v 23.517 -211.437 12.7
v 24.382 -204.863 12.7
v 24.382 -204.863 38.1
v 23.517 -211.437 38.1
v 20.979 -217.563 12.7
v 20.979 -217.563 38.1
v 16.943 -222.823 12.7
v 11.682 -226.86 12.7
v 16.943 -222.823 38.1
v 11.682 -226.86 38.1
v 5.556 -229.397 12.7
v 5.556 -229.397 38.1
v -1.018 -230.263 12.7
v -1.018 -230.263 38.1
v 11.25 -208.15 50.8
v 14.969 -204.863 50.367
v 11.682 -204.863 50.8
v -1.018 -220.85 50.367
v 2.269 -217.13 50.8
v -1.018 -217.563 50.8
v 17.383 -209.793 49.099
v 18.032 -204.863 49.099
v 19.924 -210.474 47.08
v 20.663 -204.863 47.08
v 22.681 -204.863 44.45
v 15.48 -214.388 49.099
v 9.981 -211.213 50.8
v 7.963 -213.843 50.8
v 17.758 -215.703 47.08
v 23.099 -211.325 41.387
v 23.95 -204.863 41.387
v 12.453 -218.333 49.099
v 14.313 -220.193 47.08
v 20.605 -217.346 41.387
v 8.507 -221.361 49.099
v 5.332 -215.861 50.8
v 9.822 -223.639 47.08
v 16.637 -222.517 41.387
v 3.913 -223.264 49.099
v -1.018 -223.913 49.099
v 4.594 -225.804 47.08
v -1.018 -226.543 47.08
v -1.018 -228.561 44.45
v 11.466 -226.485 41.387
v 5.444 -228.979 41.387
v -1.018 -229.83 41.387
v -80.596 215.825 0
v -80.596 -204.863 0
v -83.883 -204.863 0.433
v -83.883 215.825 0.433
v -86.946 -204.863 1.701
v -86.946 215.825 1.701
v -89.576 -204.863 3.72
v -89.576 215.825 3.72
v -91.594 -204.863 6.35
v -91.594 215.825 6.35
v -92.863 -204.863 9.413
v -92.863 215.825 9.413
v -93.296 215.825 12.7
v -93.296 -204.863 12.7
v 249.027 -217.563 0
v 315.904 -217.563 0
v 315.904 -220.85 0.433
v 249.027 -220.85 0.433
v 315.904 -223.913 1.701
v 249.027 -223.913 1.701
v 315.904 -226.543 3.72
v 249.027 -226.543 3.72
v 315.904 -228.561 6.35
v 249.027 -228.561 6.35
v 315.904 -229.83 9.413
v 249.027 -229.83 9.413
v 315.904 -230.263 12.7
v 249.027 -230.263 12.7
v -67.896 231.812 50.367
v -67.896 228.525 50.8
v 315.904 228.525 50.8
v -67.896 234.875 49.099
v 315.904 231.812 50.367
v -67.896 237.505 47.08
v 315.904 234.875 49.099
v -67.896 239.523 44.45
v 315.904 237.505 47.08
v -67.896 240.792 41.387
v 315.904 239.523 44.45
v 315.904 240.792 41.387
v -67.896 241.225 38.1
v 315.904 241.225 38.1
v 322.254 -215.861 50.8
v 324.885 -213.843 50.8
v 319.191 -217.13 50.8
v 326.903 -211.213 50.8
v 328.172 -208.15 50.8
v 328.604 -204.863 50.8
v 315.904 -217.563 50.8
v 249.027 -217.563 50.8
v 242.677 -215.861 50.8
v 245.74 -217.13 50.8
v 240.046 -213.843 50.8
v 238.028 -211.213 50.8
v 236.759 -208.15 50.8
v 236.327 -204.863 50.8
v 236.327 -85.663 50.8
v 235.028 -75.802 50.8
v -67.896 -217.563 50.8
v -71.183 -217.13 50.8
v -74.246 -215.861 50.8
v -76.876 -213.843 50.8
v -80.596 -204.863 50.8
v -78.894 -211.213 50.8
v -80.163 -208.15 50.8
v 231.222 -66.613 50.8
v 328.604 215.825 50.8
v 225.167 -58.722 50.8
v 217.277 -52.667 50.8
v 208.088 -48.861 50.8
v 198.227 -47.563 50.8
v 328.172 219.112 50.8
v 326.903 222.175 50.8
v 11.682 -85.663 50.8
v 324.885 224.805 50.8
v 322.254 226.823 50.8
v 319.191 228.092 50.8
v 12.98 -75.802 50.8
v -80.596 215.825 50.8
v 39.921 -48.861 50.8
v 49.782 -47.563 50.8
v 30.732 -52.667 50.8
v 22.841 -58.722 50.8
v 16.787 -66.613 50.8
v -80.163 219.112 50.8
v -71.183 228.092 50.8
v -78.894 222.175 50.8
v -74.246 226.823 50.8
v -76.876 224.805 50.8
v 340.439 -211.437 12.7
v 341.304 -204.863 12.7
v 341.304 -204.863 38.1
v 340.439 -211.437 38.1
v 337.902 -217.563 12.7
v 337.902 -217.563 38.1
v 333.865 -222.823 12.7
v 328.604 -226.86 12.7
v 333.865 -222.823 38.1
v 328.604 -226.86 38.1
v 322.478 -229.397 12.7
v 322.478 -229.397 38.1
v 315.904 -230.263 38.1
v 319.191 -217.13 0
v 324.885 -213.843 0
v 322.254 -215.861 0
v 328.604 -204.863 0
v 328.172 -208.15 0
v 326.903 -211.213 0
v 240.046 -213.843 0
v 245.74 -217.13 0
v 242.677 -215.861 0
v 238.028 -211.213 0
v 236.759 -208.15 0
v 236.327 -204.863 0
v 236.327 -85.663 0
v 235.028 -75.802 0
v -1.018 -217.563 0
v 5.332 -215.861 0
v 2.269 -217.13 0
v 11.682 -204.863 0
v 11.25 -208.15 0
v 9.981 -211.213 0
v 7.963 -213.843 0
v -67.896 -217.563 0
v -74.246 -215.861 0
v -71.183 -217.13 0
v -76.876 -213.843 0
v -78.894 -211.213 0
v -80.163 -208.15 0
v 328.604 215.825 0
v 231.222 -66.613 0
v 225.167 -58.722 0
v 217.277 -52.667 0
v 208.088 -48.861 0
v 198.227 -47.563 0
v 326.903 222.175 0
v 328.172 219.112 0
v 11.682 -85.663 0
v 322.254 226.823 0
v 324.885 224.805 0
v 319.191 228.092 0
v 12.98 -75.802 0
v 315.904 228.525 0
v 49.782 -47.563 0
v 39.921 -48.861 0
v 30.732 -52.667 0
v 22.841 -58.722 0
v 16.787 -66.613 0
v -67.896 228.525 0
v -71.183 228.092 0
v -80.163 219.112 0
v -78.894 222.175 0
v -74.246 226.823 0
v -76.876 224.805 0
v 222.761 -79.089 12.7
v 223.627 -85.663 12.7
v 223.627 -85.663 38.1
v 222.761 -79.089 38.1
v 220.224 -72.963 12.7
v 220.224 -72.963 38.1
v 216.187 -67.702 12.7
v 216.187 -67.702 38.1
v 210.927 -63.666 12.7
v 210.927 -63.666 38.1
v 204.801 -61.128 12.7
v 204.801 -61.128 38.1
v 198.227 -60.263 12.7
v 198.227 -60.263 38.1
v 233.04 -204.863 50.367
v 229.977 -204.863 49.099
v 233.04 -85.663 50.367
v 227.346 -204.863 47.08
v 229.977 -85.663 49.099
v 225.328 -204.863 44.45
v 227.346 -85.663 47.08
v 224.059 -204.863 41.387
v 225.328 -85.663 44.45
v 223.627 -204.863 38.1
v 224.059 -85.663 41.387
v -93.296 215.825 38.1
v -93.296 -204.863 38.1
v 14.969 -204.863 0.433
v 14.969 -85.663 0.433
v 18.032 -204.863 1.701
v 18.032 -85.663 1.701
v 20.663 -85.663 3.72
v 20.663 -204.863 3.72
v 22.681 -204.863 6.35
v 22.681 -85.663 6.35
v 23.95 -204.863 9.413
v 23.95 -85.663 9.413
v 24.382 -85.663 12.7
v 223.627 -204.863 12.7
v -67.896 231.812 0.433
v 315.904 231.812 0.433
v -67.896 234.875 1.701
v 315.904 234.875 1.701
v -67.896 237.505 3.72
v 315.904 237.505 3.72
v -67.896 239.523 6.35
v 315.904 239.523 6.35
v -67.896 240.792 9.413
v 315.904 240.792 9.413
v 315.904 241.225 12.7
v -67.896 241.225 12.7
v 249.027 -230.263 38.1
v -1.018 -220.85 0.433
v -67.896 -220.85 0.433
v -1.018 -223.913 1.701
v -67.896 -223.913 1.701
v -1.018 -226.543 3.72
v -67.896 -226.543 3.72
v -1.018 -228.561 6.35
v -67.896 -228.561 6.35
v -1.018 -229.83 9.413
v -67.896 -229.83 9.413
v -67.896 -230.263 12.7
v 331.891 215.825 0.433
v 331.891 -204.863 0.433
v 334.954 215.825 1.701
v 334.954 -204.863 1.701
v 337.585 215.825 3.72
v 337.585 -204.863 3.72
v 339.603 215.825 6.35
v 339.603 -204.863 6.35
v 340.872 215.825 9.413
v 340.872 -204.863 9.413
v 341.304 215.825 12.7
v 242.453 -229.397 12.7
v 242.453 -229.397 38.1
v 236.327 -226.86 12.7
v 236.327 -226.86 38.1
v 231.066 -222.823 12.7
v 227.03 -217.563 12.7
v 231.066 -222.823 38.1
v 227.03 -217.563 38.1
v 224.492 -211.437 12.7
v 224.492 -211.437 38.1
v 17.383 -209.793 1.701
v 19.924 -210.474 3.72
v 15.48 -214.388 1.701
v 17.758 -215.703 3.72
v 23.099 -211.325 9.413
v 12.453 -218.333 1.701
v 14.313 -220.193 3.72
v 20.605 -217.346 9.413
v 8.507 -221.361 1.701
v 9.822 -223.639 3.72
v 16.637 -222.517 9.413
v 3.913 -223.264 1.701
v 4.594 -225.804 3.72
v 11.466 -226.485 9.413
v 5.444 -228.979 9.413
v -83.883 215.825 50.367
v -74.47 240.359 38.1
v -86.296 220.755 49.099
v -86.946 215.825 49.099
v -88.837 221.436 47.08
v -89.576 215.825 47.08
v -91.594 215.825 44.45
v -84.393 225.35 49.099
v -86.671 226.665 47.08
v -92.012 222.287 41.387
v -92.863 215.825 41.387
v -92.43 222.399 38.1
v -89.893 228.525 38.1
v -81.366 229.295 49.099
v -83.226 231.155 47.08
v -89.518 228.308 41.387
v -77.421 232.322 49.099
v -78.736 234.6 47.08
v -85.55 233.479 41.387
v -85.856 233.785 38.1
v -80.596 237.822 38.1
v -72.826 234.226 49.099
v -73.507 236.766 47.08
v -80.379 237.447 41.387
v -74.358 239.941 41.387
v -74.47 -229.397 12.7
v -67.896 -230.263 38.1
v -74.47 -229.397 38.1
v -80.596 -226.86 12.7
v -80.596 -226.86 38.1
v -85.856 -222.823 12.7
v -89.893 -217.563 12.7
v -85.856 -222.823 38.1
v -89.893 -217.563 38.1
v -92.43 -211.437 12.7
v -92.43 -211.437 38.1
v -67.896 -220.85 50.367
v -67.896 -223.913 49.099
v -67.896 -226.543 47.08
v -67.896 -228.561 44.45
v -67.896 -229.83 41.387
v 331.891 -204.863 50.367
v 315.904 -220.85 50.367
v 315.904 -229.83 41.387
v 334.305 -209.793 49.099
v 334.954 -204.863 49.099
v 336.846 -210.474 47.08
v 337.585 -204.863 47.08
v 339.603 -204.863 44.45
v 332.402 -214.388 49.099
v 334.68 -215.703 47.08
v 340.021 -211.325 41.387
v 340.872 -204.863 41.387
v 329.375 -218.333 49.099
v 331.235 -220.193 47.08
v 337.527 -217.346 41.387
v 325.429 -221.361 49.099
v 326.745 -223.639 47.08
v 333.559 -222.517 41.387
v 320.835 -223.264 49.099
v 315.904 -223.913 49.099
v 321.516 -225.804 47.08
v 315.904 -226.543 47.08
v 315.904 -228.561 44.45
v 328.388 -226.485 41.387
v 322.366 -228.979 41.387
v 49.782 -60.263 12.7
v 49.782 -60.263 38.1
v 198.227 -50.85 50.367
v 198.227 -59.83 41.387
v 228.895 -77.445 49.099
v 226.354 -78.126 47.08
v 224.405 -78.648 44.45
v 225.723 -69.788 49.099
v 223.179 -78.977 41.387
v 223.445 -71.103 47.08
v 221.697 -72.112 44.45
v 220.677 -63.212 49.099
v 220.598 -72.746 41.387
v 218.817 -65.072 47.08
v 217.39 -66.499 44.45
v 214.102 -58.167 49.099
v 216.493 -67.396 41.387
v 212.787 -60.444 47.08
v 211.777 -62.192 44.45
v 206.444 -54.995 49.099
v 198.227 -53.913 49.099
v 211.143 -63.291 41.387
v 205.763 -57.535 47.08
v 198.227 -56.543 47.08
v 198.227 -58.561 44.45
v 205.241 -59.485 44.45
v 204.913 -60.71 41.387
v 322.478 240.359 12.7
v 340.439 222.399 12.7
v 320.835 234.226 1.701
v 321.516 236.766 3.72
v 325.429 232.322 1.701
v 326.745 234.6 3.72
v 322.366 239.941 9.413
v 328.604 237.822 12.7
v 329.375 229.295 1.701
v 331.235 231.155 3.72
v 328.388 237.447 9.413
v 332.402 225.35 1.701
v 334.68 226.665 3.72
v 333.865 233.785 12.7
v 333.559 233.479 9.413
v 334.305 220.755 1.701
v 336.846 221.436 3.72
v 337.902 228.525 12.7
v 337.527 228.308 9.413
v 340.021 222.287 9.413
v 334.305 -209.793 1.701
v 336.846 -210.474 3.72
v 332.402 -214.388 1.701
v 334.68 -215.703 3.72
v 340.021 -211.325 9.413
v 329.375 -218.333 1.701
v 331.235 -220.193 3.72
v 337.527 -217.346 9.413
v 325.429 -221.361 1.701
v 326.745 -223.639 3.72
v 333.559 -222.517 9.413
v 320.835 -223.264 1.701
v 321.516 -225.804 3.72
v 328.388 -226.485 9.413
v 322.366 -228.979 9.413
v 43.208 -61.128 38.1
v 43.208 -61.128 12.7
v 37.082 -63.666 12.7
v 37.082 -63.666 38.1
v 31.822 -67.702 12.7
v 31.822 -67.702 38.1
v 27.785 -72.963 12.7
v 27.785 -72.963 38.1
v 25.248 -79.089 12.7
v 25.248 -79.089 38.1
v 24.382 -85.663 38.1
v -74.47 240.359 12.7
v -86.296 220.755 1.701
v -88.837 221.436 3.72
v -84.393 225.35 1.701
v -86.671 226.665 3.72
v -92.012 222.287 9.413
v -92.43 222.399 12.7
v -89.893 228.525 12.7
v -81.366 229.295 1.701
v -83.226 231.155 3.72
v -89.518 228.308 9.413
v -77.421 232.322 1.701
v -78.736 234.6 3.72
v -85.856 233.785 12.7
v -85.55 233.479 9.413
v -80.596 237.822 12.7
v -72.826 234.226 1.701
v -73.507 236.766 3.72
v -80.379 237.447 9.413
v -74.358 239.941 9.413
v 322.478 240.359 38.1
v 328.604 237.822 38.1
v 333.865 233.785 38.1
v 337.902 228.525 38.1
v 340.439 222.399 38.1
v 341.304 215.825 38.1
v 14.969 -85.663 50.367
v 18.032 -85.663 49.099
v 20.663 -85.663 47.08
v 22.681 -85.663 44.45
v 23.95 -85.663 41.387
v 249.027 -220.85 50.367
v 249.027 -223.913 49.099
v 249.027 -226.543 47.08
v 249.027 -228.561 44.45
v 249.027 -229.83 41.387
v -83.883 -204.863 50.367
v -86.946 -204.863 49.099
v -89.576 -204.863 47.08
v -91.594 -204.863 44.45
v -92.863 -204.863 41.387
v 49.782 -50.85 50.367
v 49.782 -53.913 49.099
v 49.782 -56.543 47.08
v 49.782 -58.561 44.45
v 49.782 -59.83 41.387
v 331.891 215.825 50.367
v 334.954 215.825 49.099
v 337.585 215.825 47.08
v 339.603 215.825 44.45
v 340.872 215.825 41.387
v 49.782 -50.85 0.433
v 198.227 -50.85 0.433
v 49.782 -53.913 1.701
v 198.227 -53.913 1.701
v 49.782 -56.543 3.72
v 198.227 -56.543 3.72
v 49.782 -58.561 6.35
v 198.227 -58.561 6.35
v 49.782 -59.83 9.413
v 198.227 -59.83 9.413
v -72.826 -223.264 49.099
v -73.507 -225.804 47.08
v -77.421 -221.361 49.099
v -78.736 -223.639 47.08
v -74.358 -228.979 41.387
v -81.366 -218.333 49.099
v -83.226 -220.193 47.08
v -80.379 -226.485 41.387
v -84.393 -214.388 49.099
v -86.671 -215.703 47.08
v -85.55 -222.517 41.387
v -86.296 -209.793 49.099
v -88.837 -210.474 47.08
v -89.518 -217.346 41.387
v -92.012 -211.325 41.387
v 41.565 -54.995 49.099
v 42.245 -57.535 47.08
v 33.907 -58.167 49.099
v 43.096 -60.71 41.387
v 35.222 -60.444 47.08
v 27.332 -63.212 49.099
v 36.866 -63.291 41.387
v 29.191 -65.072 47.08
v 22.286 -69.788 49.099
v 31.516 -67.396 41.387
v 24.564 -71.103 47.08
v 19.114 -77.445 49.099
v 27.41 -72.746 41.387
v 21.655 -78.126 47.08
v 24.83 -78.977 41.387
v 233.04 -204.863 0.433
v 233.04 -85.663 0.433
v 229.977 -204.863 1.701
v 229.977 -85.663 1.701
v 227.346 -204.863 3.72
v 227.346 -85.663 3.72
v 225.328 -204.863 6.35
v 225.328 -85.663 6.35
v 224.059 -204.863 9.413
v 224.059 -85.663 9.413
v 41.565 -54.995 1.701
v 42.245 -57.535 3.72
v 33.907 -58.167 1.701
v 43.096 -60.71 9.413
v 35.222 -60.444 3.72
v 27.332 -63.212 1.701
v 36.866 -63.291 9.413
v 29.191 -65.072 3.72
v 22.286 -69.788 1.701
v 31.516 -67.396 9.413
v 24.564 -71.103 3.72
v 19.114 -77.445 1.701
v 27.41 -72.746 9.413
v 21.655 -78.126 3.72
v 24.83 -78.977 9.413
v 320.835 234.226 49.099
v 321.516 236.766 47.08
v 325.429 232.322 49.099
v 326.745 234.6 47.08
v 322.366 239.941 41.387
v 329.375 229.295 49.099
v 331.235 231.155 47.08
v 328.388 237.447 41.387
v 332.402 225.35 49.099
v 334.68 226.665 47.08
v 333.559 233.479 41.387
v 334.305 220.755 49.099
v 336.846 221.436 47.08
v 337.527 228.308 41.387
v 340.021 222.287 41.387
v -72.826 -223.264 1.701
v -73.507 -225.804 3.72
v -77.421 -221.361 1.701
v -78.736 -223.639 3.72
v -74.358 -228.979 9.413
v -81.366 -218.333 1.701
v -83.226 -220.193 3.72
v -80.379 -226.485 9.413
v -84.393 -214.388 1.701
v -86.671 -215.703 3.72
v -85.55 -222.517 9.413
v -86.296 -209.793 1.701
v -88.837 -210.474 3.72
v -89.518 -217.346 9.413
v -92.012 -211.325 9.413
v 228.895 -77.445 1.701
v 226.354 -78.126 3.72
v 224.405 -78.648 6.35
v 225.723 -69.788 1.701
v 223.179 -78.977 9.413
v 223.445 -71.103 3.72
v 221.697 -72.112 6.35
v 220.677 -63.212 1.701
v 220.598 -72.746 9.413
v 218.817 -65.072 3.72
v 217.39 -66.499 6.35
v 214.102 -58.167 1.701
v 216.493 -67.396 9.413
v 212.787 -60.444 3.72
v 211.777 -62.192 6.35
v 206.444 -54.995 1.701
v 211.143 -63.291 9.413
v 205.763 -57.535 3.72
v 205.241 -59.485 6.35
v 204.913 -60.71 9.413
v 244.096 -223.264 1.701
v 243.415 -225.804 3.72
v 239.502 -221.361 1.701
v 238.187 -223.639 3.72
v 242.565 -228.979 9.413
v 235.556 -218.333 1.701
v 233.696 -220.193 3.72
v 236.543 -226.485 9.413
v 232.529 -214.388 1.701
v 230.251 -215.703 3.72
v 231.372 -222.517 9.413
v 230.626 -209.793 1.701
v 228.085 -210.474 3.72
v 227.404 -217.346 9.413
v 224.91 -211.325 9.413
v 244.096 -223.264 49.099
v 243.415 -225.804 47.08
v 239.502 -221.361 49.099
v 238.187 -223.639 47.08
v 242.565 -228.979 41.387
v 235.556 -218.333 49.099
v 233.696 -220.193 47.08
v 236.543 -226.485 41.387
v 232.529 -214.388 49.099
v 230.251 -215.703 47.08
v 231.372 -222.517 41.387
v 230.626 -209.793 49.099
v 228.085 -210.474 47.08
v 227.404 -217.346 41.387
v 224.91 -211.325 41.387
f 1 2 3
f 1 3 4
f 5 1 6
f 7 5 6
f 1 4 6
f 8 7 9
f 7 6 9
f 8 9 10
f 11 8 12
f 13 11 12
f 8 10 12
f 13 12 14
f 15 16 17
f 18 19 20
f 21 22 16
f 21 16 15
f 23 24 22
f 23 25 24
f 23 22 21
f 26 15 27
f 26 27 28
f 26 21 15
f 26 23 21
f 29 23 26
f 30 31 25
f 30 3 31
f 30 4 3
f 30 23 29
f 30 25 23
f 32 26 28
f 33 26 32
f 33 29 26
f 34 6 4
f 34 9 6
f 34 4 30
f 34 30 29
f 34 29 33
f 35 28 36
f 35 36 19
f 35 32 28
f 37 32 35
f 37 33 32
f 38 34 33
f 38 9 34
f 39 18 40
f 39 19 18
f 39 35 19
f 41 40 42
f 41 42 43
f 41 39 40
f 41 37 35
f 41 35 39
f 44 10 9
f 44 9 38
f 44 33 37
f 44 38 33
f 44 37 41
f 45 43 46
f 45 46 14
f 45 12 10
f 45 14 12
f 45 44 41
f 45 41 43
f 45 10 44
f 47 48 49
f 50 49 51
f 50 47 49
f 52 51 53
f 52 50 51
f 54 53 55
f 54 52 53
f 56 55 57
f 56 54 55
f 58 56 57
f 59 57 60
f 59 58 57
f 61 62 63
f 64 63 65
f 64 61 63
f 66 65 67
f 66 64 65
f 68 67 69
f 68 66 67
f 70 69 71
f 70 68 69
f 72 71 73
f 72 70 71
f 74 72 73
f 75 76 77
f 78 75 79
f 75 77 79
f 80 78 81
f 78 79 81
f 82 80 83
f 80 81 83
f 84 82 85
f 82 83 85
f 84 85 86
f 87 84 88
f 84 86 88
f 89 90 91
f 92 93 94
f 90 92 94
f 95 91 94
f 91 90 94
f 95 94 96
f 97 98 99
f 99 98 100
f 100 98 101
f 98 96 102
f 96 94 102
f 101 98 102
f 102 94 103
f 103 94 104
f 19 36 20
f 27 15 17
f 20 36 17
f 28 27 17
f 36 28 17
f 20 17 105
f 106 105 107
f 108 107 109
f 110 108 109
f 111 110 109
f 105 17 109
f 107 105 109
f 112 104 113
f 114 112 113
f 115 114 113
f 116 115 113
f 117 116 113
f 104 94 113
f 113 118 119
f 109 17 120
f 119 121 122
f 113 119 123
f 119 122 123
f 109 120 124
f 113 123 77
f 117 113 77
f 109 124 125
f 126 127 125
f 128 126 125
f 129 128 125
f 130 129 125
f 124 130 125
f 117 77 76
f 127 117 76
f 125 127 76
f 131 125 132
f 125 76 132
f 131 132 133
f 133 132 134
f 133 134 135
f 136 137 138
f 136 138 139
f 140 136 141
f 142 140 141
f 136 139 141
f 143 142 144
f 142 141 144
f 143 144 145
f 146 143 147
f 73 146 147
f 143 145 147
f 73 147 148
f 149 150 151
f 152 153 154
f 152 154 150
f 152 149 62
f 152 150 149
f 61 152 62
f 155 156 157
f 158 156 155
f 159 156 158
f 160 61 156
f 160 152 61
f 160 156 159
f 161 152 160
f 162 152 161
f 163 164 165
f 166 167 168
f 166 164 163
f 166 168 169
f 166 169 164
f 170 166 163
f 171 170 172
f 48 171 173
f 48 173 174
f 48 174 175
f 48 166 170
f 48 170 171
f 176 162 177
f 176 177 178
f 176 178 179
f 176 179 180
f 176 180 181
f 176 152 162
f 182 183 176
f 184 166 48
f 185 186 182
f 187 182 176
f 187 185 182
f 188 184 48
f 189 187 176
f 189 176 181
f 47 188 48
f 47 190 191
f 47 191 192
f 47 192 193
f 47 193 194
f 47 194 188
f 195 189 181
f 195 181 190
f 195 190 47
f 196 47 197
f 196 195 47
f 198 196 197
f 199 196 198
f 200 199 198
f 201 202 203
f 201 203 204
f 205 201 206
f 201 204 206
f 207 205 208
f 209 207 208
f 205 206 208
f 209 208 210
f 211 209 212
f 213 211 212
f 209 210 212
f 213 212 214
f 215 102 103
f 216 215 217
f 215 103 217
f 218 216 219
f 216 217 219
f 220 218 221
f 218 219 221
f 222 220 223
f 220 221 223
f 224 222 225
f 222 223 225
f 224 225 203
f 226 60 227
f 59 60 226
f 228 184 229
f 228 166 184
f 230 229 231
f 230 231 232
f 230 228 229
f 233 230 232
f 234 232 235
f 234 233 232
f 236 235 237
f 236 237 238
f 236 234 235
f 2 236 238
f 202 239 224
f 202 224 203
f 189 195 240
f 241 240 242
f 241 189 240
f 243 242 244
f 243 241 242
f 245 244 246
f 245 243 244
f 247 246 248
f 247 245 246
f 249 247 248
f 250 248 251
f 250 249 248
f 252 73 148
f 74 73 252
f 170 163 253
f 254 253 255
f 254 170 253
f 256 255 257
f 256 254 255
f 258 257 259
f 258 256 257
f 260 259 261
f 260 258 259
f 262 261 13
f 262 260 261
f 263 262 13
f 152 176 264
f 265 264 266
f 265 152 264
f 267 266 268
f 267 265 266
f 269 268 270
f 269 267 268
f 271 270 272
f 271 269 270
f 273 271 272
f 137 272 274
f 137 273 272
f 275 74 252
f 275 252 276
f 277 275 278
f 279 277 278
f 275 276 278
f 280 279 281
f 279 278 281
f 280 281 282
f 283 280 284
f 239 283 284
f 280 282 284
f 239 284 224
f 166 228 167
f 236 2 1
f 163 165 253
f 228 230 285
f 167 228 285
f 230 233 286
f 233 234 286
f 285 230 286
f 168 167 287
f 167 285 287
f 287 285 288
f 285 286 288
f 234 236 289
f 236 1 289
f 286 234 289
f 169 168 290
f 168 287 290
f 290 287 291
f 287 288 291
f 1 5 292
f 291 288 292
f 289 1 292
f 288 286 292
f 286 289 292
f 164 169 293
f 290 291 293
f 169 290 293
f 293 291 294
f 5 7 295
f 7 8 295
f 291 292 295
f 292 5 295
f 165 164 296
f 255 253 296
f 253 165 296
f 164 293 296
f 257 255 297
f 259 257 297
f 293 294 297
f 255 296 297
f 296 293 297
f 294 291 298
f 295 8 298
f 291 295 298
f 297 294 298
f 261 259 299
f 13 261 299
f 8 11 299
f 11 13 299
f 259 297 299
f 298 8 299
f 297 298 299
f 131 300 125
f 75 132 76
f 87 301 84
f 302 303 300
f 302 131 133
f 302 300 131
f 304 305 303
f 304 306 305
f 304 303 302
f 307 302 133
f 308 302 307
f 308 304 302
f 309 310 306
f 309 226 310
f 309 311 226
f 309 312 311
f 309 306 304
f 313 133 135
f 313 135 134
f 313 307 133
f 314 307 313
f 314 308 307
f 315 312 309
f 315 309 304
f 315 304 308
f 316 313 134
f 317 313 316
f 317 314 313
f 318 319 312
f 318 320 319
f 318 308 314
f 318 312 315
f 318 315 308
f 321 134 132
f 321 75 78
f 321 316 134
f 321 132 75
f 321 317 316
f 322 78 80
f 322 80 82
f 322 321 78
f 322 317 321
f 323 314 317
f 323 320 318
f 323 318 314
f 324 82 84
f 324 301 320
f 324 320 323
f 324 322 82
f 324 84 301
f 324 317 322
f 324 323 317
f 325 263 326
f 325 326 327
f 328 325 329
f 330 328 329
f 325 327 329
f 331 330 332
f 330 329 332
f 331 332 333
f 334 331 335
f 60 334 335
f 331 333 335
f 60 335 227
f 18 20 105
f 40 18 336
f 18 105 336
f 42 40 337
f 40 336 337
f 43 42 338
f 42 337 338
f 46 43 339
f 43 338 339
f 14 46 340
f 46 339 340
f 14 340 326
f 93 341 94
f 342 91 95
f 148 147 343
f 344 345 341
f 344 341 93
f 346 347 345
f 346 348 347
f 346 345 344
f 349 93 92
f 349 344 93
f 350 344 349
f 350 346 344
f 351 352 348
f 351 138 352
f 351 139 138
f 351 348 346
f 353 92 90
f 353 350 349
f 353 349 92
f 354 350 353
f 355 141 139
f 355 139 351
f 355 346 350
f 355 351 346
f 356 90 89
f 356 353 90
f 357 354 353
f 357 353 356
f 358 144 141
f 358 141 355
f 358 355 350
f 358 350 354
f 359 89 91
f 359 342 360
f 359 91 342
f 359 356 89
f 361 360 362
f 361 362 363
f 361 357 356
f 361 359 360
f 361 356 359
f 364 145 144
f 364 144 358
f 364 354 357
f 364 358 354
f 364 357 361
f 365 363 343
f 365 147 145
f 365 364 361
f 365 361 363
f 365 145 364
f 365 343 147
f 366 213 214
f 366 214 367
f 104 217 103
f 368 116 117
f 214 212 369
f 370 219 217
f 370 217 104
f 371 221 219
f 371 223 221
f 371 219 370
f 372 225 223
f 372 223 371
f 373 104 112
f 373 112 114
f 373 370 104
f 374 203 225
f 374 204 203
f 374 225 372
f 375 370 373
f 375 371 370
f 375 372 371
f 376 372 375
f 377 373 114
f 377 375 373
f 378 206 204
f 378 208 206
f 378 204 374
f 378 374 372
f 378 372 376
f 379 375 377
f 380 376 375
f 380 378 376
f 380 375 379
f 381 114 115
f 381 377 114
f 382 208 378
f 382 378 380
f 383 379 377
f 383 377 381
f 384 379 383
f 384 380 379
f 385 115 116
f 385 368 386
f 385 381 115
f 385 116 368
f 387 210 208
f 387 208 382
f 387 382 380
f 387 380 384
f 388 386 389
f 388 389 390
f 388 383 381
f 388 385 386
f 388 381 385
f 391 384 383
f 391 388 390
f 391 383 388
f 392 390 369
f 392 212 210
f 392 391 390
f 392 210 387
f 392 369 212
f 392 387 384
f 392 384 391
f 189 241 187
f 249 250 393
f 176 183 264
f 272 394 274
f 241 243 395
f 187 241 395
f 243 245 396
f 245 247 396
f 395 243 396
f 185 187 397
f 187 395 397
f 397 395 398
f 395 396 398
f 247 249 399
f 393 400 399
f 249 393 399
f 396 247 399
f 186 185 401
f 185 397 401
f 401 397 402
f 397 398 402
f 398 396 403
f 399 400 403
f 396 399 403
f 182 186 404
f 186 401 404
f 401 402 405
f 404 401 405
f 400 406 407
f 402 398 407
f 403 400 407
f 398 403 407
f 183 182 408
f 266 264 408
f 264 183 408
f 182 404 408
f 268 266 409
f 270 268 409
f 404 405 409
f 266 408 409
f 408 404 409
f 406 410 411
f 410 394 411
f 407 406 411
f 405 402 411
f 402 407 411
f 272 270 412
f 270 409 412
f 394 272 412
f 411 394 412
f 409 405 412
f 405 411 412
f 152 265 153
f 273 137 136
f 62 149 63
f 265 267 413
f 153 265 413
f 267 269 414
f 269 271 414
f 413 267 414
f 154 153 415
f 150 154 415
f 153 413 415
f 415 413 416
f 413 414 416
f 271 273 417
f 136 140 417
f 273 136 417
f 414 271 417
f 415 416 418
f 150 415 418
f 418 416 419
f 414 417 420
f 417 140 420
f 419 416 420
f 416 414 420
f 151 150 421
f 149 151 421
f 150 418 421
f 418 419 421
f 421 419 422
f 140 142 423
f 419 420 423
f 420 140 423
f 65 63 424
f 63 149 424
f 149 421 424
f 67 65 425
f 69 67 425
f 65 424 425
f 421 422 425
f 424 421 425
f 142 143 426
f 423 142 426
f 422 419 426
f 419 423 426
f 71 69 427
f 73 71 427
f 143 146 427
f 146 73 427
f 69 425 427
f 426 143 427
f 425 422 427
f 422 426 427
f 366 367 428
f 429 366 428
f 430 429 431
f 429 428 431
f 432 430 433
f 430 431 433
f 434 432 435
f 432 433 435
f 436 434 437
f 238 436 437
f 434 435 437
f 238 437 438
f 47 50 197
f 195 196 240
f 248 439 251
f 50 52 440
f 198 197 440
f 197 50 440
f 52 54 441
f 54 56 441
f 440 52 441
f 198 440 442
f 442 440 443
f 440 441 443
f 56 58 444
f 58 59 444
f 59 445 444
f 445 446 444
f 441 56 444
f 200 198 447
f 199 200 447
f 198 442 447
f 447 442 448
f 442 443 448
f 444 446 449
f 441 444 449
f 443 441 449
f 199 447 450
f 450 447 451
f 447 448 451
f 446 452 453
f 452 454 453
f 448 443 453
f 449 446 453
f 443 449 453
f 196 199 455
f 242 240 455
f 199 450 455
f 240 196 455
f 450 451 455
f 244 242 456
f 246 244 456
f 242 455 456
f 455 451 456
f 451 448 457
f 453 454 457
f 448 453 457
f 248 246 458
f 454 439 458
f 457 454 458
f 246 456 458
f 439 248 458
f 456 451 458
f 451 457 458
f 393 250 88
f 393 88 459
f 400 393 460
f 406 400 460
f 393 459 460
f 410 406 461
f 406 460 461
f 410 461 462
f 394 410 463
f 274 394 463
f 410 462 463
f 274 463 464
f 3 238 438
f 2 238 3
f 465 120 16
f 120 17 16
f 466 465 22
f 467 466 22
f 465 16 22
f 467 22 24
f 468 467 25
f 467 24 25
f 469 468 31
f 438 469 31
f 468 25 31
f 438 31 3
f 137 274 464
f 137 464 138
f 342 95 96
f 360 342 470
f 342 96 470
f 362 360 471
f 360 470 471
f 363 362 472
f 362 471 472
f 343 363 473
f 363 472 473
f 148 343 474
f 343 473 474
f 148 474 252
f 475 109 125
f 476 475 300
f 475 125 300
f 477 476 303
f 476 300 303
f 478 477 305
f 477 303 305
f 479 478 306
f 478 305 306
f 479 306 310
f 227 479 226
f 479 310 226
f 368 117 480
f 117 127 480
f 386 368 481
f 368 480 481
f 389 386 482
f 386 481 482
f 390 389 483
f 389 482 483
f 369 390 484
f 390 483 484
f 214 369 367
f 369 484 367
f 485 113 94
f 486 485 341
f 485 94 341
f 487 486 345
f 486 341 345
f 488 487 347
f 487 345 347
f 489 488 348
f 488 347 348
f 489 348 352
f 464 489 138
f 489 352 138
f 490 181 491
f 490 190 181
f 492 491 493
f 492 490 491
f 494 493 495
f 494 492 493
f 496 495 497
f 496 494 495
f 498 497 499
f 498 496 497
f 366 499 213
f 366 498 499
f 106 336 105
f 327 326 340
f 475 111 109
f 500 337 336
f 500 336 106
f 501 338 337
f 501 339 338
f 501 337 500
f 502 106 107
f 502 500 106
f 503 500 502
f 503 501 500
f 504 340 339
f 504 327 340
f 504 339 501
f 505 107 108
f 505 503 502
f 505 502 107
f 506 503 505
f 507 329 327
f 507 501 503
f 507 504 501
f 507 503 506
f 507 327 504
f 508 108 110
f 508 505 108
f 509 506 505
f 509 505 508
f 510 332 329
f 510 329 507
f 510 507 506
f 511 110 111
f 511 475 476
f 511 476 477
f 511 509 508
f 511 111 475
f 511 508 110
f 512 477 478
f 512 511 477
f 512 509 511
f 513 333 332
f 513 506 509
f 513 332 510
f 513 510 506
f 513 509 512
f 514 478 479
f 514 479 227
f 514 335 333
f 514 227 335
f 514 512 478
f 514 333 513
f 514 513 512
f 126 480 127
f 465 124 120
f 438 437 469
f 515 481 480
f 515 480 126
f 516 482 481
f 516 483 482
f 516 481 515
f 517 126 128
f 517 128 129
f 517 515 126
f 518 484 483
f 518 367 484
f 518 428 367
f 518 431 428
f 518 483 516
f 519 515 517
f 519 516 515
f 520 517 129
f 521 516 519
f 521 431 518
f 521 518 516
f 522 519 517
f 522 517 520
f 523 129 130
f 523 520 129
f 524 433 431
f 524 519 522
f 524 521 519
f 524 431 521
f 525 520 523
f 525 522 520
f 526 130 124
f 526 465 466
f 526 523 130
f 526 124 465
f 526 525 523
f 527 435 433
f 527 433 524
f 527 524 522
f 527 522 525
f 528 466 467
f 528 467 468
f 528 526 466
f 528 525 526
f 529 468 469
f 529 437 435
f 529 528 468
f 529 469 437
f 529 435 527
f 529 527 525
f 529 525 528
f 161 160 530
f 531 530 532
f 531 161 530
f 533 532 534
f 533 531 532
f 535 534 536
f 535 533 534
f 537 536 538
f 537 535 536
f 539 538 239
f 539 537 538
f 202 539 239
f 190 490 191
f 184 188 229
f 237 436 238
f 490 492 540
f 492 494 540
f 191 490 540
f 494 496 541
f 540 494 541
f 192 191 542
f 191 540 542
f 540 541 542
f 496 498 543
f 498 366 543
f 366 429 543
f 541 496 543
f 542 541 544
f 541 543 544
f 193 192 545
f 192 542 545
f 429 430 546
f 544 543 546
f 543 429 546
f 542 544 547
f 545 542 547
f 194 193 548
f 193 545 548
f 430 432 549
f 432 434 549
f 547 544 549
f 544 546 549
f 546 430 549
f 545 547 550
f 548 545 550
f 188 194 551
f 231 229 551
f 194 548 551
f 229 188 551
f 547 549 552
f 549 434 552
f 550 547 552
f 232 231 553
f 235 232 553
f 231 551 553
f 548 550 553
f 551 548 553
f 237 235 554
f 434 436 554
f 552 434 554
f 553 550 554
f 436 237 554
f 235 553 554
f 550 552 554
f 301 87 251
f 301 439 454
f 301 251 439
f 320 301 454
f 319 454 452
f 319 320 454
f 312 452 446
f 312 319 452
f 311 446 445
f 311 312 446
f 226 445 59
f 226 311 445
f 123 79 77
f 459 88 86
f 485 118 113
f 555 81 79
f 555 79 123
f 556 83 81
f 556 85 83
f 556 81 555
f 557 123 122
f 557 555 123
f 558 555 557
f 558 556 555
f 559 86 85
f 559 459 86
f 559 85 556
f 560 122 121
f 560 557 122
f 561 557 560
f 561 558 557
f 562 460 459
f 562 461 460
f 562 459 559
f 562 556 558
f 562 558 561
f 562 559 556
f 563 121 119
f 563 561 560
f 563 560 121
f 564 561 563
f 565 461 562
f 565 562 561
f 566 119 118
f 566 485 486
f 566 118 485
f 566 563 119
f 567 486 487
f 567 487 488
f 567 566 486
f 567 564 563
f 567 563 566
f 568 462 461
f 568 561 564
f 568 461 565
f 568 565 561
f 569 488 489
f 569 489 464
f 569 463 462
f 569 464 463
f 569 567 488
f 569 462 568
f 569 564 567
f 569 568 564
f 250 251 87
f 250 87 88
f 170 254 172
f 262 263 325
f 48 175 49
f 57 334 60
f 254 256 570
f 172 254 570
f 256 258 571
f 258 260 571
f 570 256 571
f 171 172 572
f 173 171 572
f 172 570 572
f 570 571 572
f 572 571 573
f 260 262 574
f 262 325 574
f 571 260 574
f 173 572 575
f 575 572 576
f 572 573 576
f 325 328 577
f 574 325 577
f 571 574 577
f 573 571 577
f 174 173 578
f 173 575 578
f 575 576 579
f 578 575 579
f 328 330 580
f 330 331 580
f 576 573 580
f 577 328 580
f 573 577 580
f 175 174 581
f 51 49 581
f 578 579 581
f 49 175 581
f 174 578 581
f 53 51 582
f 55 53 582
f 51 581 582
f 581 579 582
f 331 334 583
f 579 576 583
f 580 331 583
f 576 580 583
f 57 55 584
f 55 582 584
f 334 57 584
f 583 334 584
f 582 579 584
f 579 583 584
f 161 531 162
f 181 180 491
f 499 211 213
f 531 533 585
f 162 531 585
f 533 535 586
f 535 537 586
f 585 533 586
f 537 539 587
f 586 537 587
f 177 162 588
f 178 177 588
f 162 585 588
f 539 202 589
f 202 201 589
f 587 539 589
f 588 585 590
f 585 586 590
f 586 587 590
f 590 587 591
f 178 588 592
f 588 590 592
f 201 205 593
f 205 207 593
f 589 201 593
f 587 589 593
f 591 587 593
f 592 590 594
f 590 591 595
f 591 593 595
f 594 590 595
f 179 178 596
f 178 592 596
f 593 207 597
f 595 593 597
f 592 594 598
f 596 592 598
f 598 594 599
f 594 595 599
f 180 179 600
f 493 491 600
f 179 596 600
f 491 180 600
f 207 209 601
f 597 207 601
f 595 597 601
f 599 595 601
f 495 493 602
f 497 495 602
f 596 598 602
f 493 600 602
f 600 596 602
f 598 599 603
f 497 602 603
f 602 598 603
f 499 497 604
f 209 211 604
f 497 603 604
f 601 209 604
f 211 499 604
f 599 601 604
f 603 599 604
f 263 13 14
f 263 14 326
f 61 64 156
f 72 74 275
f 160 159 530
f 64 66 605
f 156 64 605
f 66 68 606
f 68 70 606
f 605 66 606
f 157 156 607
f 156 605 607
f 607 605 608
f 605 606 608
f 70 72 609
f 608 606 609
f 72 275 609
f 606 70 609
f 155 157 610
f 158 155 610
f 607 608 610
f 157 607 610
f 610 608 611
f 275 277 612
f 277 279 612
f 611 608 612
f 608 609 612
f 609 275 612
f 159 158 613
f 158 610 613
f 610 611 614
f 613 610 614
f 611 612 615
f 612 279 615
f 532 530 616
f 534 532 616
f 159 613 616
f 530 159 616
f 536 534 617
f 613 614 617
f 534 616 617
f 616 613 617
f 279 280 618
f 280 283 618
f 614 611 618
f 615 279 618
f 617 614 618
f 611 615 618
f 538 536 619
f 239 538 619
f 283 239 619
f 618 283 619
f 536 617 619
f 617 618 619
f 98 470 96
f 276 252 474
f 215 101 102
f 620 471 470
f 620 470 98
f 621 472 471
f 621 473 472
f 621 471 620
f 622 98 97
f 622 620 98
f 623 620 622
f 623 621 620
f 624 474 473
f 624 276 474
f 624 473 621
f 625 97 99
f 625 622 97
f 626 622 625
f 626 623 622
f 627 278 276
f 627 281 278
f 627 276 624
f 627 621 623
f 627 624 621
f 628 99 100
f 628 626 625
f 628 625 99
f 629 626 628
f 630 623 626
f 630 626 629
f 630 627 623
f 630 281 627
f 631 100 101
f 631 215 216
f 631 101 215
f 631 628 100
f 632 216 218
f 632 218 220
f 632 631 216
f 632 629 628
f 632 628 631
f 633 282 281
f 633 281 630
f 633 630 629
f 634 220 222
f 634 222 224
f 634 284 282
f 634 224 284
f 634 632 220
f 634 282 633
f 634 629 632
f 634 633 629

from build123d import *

# Parameters (mm, degrees)
BOSS_EXTRUDE1_DEPTH = 50.8
FILLET1_R           = 25.4
FILLET2_R           = 12.7


with BuildPart() as part:
    # Sketch1 → Boss-Extrude1 (new body)
    with BuildSketch(Plane.XY):
        Polygon((-93.295534025, 241.224648834), (341.304465963, 241.224648834), (341.304465963, -230.262851166), (223.626687979, -230.262851166), (223.626687979, -60.262851166), (24.382243959, -60.262851166), (24.382243959, -230.262851166), (-93.295534025, -230.262851166), align=None)
    extrude(amount=BOSS_EXTRUDE1_DEPTH)

    # Fillet1
    fillet1_edges = [part.edges().sort_by_distance(p)[0] for p in [
        (-93.295534025, 241.224648834, 25.4),
        (341.304465963, 241.224648834, 25.4),
        (341.304465963, -230.262851166, 25.4),
        (223.626687979, -230.262851166, 25.4),
        (223.626687979, -60.262851166, 25.4),
        (24.382243959, -60.262851166, 25.4),
        (24.382243959, -230.262851166, 25.4),
        (-93.295534025, -230.262851166, 25.4),
    ]]
    fillet(fillet1_edges, radius=FILLET1_R)

    # Fillet2
    fillet2_edges = [part.edges().sort_by_distance(p)[0] for p in [
        (24.382243959, -145.262851166, 0),
        (24.382243959, -145.262851166, 50.8),
        (-93.295534025, 5.480898834, 0),
        (124.004465969, 241.224648834, 0),
        (341.304465963, 5.480898834, 0),
        (282.465576971, -230.262851166, 0),
        (223.626687979, -145.262851166, 0),
        (124.004465969, -60.262851166, 0),
        (-34.456645033, -230.262851166, 0),
        (231.066175737, -222.823363409, 0),
        (333.864978205, -222.823363409, 0),
        (333.864978205, 233.785161076, 0),
        (-85.856046267, 233.785161076, 0),
        (-85.856046267, -222.823363409, 0),
        (16.942756201, -222.823363409, 0),
        (-34.456645033, -230.262851166, 50.8),
        (-93.295534025, 5.480898834, 50.8),
        (124.004465969, -60.262851166, 50.8),
        (223.626687979, -145.262851166, 50.8),
        (282.465576971, -230.262851166, 50.8),
        (341.304465963, 5.480898834, 50.8),
        (124.004465969, 241.224648834, 50.8),
        (231.066175737, -222.823363409, 50.8),
        (333.864978205, -222.823363409, 50.8),
        (333.864978205, 233.785161076, 50.8),
        (-85.856046267, 233.785161076, 50.8),
        (-85.856046267, -222.823363409, 50.8),
        (16.942756201, -222.823363409, 50.8),
        (216.187200221, -67.702338924, 0),
        (216.187200221, -67.702338924, 50.8),
        (31.821731717, -67.702338924, 0),
        (31.821731717, -67.702338924, 50.8),
    ]]
    fillet(fillet2_edges, radius=FILLET2_R)


solid = part.part
